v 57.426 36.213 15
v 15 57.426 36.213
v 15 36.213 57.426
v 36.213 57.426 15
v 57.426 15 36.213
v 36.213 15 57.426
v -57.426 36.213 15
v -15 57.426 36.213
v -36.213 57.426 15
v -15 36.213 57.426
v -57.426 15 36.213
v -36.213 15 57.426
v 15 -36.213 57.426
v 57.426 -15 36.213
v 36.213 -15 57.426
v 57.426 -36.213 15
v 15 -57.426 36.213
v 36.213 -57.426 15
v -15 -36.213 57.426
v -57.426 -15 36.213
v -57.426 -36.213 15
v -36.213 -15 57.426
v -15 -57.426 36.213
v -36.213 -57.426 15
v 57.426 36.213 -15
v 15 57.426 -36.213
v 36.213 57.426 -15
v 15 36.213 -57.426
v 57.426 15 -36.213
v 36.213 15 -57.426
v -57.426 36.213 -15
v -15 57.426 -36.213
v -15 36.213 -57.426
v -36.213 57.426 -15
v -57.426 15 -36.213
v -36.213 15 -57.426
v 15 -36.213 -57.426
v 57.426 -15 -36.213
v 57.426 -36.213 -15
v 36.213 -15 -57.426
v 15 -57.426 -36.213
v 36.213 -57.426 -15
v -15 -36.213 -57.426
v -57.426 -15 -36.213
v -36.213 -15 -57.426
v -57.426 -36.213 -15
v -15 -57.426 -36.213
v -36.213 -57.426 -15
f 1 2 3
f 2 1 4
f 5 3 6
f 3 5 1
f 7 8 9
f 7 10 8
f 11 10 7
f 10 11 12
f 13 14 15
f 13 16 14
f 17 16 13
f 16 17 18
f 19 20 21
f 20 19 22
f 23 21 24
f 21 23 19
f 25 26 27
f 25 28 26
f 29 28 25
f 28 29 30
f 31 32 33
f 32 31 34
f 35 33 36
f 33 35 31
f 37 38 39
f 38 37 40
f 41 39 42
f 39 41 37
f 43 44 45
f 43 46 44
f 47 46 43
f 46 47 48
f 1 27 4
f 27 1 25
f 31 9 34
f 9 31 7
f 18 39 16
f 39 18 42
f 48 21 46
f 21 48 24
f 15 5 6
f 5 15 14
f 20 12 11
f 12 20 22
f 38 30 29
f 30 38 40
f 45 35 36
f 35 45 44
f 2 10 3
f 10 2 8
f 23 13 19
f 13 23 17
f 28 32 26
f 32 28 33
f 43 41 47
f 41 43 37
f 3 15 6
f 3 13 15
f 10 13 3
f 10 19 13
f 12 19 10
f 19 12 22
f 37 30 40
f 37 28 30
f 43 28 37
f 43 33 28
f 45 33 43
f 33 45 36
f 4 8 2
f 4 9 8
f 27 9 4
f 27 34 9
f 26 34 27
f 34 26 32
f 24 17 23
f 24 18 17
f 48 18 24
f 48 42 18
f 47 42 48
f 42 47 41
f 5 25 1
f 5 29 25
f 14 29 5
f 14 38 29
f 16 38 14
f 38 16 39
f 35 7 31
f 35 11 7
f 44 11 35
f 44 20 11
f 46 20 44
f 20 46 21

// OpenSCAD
// Truncated Cuboctahedron
// (C) @oblomobka - 2023.06
// GPL license

/* **CUSTOMIZER VARIABLES** */
// Edge
edge = 30; // [10:100]
// Center of the solid or stand over a face
position = "Center"; // ["Center", "Face"]

/* **MODULES** */   
module TruncatedCuboctahedron ( edge = 30, position = "Face"){ //bC / taC -> Conway notation
    
    // Invariants
    
    // Relations
    
    // Variables
    a = edge*(1/2+sqrt(2));
    b = edge/sqrt(2); //b represent the truncation value to obtain regular polygons. It operates on the vertex of the original polyhedron, the cuboctahedron in this case.
    c = edge/2;
    
    // Definition of points and faces V = 48 / F = 26 ( 12 squares + 8 hexagons + 6 octagons )
    // 48 vertices -> All permutations of ( +-(1+2*sqrt(2)), +-(1+sqrt(2)), +-1) -> ( +-a, +-(a-b), +-c)
    taCpoints = [
        // Every two lines construct an auxiliary box where "a" is the distance between parallel octagons and "c" the edge
        // Even permutations
        // XY
        [ +a, +(a-b), +c], [ -a, +(a-b), +c], [ +a, -(a-b), +c], [ -a, -(a-b), +c],     // UP   [  0 -  3]
        [ +a, +(a-b), -c], [ -a, +(a-b), -c], [ +a, -(a-b), -c], [ -a, -(a-b), -c],     // DOWN [  4 -  7]
        // XZ
        [ +(a-b), +c, +a], [ -(a-b), +c, +a], [ +(a-b), -c, +a], [ -(a-b), -c, +a],     // UP   [  8 - 11]
        [ +(a-b), +c, -a], [ -(a-b), +c, -a], [ +(a-b), -c, -a], [ -(a-b), -c, -a],     // DOWN [ 12 - 15]
        // YZ
        [ +c, +a, +(a-b)], [ -c, +a, +(a-b)], [ +c, -a, +(a-b)], [ -c, -a, +(a-b)],     // UP   [ 16 - 19]
        [ +c, +a, -(a-b)], [ -c, +a, -(a-b)], [ +c, -a, -(a-b)], [ -c, -a, -(a-b)],     // DOWN [ 20 - 23]
        
        // Odd permutations
        // XY
        [ +(a-b), +a, +c], [ -(a-b), +a, +c], [ +(a-b), -a, +c], [ -(a-b), -a, +c],     // UP   [ 24 - 27]
        [ +(a-b), +a, -c], [ -(a-b), +a, -c], [ +(a-b), -a, -c], [ -(a-b), -a, -c],     // DOWN [ 28 - 31]
        // XZ
        [ +a, +c, +(a-b)], [ -a, +c, +(a-b)], [ +a, -c, +(a-b)], [ -a, -c, +(a-b)],     // UP   [ 32 - 35]
        [ +a, +c, -(a-b)], [ -a, +c, -(a-b)], [ +a, -c, -(a-b)], [ -a, -c, -(a-b)],     // DOWN [ 36 - 39]
        // YZ
        [ +c, +(a-b), +a], [ -c, +(a-b), +a], [ +c, -(a-b), +a], [ -c, -(a-b), +a],     // UP   [ 40 - 43]
        [ +c, +(a-b), -a], [ -c, +(a-b), -a], [ +c, -(a-b), -a], [ -c, -(a-b), -a]      // DOWN [ 44 - 47]
        ];
        
    taCfaces = [
        // 8 Hexagons, 1 per octant
        [  0, 32,  8, 40, 16, 24],      // +X+Y+Z
        [  1, 25, 17, 41,  9, 33],      // -X+Y+Z
        [  2, 26, 18, 42, 10, 34],      // +X-Y+Z
        [  3, 35, 11, 43, 19, 27],      // -X-Y+Z
        [  4, 28, 20, 44, 12, 36],      // +X+Y-Z
        [  5, 37, 13, 45, 21, 29],      // -X+Y-Z
        [  6, 38, 14, 46, 22, 30],      // +X-Y-Z
        [  7, 31, 23, 47, 15, 39],      // -X-Y-Z
        
        // 12 Squares
        [  0, 24, 28,  4], [  1,  5, 29, 25], [  2,  6, 30, 26], [  3, 27, 31,  7], // XY
        [ 32, 34, 10,  8], [ 11, 35, 33,  9], [ 12, 14, 38, 36], [ 37, 39, 15, 13], // XZ
        [ 16, 40, 41, 17], [ 18, 19, 43, 42], [ 20, 21, 45, 44], [ 22, 46, 47, 23], // YZ
        
        // Octagons
        [  8, 10, 42, 43, 11,  9, 41, 40], [ 14, 12, 44, 45, 13, 15, 47, 46],       // parallel XY       
        [ 24, 16, 17, 25, 29, 21, 20, 28], [ 26, 30, 22, 23, 31, 27, 19, 18],       // parallel XZ
        [  0,  4, 36, 38,  6,  2, 34, 32], [  1, 33, 35,  3,  7, 39, 37,  5]        // parallel YZ
        ];
  
    // Polyhedron stands on xy plane centered on the center of the face or centered on the center of polyhedron
    if  ( position == "Center") {
        polyhedron ( taCpoints, taCfaces);}
    else if ( position == "Face"){
        translate ([ 0, 0, a])
            polyhedron ( taCpoints, taCfaces);}
    }

/* **RENDERING OF SOLIDS** */
TruncatedCuboctahedron ( edge = edge, position = position);
